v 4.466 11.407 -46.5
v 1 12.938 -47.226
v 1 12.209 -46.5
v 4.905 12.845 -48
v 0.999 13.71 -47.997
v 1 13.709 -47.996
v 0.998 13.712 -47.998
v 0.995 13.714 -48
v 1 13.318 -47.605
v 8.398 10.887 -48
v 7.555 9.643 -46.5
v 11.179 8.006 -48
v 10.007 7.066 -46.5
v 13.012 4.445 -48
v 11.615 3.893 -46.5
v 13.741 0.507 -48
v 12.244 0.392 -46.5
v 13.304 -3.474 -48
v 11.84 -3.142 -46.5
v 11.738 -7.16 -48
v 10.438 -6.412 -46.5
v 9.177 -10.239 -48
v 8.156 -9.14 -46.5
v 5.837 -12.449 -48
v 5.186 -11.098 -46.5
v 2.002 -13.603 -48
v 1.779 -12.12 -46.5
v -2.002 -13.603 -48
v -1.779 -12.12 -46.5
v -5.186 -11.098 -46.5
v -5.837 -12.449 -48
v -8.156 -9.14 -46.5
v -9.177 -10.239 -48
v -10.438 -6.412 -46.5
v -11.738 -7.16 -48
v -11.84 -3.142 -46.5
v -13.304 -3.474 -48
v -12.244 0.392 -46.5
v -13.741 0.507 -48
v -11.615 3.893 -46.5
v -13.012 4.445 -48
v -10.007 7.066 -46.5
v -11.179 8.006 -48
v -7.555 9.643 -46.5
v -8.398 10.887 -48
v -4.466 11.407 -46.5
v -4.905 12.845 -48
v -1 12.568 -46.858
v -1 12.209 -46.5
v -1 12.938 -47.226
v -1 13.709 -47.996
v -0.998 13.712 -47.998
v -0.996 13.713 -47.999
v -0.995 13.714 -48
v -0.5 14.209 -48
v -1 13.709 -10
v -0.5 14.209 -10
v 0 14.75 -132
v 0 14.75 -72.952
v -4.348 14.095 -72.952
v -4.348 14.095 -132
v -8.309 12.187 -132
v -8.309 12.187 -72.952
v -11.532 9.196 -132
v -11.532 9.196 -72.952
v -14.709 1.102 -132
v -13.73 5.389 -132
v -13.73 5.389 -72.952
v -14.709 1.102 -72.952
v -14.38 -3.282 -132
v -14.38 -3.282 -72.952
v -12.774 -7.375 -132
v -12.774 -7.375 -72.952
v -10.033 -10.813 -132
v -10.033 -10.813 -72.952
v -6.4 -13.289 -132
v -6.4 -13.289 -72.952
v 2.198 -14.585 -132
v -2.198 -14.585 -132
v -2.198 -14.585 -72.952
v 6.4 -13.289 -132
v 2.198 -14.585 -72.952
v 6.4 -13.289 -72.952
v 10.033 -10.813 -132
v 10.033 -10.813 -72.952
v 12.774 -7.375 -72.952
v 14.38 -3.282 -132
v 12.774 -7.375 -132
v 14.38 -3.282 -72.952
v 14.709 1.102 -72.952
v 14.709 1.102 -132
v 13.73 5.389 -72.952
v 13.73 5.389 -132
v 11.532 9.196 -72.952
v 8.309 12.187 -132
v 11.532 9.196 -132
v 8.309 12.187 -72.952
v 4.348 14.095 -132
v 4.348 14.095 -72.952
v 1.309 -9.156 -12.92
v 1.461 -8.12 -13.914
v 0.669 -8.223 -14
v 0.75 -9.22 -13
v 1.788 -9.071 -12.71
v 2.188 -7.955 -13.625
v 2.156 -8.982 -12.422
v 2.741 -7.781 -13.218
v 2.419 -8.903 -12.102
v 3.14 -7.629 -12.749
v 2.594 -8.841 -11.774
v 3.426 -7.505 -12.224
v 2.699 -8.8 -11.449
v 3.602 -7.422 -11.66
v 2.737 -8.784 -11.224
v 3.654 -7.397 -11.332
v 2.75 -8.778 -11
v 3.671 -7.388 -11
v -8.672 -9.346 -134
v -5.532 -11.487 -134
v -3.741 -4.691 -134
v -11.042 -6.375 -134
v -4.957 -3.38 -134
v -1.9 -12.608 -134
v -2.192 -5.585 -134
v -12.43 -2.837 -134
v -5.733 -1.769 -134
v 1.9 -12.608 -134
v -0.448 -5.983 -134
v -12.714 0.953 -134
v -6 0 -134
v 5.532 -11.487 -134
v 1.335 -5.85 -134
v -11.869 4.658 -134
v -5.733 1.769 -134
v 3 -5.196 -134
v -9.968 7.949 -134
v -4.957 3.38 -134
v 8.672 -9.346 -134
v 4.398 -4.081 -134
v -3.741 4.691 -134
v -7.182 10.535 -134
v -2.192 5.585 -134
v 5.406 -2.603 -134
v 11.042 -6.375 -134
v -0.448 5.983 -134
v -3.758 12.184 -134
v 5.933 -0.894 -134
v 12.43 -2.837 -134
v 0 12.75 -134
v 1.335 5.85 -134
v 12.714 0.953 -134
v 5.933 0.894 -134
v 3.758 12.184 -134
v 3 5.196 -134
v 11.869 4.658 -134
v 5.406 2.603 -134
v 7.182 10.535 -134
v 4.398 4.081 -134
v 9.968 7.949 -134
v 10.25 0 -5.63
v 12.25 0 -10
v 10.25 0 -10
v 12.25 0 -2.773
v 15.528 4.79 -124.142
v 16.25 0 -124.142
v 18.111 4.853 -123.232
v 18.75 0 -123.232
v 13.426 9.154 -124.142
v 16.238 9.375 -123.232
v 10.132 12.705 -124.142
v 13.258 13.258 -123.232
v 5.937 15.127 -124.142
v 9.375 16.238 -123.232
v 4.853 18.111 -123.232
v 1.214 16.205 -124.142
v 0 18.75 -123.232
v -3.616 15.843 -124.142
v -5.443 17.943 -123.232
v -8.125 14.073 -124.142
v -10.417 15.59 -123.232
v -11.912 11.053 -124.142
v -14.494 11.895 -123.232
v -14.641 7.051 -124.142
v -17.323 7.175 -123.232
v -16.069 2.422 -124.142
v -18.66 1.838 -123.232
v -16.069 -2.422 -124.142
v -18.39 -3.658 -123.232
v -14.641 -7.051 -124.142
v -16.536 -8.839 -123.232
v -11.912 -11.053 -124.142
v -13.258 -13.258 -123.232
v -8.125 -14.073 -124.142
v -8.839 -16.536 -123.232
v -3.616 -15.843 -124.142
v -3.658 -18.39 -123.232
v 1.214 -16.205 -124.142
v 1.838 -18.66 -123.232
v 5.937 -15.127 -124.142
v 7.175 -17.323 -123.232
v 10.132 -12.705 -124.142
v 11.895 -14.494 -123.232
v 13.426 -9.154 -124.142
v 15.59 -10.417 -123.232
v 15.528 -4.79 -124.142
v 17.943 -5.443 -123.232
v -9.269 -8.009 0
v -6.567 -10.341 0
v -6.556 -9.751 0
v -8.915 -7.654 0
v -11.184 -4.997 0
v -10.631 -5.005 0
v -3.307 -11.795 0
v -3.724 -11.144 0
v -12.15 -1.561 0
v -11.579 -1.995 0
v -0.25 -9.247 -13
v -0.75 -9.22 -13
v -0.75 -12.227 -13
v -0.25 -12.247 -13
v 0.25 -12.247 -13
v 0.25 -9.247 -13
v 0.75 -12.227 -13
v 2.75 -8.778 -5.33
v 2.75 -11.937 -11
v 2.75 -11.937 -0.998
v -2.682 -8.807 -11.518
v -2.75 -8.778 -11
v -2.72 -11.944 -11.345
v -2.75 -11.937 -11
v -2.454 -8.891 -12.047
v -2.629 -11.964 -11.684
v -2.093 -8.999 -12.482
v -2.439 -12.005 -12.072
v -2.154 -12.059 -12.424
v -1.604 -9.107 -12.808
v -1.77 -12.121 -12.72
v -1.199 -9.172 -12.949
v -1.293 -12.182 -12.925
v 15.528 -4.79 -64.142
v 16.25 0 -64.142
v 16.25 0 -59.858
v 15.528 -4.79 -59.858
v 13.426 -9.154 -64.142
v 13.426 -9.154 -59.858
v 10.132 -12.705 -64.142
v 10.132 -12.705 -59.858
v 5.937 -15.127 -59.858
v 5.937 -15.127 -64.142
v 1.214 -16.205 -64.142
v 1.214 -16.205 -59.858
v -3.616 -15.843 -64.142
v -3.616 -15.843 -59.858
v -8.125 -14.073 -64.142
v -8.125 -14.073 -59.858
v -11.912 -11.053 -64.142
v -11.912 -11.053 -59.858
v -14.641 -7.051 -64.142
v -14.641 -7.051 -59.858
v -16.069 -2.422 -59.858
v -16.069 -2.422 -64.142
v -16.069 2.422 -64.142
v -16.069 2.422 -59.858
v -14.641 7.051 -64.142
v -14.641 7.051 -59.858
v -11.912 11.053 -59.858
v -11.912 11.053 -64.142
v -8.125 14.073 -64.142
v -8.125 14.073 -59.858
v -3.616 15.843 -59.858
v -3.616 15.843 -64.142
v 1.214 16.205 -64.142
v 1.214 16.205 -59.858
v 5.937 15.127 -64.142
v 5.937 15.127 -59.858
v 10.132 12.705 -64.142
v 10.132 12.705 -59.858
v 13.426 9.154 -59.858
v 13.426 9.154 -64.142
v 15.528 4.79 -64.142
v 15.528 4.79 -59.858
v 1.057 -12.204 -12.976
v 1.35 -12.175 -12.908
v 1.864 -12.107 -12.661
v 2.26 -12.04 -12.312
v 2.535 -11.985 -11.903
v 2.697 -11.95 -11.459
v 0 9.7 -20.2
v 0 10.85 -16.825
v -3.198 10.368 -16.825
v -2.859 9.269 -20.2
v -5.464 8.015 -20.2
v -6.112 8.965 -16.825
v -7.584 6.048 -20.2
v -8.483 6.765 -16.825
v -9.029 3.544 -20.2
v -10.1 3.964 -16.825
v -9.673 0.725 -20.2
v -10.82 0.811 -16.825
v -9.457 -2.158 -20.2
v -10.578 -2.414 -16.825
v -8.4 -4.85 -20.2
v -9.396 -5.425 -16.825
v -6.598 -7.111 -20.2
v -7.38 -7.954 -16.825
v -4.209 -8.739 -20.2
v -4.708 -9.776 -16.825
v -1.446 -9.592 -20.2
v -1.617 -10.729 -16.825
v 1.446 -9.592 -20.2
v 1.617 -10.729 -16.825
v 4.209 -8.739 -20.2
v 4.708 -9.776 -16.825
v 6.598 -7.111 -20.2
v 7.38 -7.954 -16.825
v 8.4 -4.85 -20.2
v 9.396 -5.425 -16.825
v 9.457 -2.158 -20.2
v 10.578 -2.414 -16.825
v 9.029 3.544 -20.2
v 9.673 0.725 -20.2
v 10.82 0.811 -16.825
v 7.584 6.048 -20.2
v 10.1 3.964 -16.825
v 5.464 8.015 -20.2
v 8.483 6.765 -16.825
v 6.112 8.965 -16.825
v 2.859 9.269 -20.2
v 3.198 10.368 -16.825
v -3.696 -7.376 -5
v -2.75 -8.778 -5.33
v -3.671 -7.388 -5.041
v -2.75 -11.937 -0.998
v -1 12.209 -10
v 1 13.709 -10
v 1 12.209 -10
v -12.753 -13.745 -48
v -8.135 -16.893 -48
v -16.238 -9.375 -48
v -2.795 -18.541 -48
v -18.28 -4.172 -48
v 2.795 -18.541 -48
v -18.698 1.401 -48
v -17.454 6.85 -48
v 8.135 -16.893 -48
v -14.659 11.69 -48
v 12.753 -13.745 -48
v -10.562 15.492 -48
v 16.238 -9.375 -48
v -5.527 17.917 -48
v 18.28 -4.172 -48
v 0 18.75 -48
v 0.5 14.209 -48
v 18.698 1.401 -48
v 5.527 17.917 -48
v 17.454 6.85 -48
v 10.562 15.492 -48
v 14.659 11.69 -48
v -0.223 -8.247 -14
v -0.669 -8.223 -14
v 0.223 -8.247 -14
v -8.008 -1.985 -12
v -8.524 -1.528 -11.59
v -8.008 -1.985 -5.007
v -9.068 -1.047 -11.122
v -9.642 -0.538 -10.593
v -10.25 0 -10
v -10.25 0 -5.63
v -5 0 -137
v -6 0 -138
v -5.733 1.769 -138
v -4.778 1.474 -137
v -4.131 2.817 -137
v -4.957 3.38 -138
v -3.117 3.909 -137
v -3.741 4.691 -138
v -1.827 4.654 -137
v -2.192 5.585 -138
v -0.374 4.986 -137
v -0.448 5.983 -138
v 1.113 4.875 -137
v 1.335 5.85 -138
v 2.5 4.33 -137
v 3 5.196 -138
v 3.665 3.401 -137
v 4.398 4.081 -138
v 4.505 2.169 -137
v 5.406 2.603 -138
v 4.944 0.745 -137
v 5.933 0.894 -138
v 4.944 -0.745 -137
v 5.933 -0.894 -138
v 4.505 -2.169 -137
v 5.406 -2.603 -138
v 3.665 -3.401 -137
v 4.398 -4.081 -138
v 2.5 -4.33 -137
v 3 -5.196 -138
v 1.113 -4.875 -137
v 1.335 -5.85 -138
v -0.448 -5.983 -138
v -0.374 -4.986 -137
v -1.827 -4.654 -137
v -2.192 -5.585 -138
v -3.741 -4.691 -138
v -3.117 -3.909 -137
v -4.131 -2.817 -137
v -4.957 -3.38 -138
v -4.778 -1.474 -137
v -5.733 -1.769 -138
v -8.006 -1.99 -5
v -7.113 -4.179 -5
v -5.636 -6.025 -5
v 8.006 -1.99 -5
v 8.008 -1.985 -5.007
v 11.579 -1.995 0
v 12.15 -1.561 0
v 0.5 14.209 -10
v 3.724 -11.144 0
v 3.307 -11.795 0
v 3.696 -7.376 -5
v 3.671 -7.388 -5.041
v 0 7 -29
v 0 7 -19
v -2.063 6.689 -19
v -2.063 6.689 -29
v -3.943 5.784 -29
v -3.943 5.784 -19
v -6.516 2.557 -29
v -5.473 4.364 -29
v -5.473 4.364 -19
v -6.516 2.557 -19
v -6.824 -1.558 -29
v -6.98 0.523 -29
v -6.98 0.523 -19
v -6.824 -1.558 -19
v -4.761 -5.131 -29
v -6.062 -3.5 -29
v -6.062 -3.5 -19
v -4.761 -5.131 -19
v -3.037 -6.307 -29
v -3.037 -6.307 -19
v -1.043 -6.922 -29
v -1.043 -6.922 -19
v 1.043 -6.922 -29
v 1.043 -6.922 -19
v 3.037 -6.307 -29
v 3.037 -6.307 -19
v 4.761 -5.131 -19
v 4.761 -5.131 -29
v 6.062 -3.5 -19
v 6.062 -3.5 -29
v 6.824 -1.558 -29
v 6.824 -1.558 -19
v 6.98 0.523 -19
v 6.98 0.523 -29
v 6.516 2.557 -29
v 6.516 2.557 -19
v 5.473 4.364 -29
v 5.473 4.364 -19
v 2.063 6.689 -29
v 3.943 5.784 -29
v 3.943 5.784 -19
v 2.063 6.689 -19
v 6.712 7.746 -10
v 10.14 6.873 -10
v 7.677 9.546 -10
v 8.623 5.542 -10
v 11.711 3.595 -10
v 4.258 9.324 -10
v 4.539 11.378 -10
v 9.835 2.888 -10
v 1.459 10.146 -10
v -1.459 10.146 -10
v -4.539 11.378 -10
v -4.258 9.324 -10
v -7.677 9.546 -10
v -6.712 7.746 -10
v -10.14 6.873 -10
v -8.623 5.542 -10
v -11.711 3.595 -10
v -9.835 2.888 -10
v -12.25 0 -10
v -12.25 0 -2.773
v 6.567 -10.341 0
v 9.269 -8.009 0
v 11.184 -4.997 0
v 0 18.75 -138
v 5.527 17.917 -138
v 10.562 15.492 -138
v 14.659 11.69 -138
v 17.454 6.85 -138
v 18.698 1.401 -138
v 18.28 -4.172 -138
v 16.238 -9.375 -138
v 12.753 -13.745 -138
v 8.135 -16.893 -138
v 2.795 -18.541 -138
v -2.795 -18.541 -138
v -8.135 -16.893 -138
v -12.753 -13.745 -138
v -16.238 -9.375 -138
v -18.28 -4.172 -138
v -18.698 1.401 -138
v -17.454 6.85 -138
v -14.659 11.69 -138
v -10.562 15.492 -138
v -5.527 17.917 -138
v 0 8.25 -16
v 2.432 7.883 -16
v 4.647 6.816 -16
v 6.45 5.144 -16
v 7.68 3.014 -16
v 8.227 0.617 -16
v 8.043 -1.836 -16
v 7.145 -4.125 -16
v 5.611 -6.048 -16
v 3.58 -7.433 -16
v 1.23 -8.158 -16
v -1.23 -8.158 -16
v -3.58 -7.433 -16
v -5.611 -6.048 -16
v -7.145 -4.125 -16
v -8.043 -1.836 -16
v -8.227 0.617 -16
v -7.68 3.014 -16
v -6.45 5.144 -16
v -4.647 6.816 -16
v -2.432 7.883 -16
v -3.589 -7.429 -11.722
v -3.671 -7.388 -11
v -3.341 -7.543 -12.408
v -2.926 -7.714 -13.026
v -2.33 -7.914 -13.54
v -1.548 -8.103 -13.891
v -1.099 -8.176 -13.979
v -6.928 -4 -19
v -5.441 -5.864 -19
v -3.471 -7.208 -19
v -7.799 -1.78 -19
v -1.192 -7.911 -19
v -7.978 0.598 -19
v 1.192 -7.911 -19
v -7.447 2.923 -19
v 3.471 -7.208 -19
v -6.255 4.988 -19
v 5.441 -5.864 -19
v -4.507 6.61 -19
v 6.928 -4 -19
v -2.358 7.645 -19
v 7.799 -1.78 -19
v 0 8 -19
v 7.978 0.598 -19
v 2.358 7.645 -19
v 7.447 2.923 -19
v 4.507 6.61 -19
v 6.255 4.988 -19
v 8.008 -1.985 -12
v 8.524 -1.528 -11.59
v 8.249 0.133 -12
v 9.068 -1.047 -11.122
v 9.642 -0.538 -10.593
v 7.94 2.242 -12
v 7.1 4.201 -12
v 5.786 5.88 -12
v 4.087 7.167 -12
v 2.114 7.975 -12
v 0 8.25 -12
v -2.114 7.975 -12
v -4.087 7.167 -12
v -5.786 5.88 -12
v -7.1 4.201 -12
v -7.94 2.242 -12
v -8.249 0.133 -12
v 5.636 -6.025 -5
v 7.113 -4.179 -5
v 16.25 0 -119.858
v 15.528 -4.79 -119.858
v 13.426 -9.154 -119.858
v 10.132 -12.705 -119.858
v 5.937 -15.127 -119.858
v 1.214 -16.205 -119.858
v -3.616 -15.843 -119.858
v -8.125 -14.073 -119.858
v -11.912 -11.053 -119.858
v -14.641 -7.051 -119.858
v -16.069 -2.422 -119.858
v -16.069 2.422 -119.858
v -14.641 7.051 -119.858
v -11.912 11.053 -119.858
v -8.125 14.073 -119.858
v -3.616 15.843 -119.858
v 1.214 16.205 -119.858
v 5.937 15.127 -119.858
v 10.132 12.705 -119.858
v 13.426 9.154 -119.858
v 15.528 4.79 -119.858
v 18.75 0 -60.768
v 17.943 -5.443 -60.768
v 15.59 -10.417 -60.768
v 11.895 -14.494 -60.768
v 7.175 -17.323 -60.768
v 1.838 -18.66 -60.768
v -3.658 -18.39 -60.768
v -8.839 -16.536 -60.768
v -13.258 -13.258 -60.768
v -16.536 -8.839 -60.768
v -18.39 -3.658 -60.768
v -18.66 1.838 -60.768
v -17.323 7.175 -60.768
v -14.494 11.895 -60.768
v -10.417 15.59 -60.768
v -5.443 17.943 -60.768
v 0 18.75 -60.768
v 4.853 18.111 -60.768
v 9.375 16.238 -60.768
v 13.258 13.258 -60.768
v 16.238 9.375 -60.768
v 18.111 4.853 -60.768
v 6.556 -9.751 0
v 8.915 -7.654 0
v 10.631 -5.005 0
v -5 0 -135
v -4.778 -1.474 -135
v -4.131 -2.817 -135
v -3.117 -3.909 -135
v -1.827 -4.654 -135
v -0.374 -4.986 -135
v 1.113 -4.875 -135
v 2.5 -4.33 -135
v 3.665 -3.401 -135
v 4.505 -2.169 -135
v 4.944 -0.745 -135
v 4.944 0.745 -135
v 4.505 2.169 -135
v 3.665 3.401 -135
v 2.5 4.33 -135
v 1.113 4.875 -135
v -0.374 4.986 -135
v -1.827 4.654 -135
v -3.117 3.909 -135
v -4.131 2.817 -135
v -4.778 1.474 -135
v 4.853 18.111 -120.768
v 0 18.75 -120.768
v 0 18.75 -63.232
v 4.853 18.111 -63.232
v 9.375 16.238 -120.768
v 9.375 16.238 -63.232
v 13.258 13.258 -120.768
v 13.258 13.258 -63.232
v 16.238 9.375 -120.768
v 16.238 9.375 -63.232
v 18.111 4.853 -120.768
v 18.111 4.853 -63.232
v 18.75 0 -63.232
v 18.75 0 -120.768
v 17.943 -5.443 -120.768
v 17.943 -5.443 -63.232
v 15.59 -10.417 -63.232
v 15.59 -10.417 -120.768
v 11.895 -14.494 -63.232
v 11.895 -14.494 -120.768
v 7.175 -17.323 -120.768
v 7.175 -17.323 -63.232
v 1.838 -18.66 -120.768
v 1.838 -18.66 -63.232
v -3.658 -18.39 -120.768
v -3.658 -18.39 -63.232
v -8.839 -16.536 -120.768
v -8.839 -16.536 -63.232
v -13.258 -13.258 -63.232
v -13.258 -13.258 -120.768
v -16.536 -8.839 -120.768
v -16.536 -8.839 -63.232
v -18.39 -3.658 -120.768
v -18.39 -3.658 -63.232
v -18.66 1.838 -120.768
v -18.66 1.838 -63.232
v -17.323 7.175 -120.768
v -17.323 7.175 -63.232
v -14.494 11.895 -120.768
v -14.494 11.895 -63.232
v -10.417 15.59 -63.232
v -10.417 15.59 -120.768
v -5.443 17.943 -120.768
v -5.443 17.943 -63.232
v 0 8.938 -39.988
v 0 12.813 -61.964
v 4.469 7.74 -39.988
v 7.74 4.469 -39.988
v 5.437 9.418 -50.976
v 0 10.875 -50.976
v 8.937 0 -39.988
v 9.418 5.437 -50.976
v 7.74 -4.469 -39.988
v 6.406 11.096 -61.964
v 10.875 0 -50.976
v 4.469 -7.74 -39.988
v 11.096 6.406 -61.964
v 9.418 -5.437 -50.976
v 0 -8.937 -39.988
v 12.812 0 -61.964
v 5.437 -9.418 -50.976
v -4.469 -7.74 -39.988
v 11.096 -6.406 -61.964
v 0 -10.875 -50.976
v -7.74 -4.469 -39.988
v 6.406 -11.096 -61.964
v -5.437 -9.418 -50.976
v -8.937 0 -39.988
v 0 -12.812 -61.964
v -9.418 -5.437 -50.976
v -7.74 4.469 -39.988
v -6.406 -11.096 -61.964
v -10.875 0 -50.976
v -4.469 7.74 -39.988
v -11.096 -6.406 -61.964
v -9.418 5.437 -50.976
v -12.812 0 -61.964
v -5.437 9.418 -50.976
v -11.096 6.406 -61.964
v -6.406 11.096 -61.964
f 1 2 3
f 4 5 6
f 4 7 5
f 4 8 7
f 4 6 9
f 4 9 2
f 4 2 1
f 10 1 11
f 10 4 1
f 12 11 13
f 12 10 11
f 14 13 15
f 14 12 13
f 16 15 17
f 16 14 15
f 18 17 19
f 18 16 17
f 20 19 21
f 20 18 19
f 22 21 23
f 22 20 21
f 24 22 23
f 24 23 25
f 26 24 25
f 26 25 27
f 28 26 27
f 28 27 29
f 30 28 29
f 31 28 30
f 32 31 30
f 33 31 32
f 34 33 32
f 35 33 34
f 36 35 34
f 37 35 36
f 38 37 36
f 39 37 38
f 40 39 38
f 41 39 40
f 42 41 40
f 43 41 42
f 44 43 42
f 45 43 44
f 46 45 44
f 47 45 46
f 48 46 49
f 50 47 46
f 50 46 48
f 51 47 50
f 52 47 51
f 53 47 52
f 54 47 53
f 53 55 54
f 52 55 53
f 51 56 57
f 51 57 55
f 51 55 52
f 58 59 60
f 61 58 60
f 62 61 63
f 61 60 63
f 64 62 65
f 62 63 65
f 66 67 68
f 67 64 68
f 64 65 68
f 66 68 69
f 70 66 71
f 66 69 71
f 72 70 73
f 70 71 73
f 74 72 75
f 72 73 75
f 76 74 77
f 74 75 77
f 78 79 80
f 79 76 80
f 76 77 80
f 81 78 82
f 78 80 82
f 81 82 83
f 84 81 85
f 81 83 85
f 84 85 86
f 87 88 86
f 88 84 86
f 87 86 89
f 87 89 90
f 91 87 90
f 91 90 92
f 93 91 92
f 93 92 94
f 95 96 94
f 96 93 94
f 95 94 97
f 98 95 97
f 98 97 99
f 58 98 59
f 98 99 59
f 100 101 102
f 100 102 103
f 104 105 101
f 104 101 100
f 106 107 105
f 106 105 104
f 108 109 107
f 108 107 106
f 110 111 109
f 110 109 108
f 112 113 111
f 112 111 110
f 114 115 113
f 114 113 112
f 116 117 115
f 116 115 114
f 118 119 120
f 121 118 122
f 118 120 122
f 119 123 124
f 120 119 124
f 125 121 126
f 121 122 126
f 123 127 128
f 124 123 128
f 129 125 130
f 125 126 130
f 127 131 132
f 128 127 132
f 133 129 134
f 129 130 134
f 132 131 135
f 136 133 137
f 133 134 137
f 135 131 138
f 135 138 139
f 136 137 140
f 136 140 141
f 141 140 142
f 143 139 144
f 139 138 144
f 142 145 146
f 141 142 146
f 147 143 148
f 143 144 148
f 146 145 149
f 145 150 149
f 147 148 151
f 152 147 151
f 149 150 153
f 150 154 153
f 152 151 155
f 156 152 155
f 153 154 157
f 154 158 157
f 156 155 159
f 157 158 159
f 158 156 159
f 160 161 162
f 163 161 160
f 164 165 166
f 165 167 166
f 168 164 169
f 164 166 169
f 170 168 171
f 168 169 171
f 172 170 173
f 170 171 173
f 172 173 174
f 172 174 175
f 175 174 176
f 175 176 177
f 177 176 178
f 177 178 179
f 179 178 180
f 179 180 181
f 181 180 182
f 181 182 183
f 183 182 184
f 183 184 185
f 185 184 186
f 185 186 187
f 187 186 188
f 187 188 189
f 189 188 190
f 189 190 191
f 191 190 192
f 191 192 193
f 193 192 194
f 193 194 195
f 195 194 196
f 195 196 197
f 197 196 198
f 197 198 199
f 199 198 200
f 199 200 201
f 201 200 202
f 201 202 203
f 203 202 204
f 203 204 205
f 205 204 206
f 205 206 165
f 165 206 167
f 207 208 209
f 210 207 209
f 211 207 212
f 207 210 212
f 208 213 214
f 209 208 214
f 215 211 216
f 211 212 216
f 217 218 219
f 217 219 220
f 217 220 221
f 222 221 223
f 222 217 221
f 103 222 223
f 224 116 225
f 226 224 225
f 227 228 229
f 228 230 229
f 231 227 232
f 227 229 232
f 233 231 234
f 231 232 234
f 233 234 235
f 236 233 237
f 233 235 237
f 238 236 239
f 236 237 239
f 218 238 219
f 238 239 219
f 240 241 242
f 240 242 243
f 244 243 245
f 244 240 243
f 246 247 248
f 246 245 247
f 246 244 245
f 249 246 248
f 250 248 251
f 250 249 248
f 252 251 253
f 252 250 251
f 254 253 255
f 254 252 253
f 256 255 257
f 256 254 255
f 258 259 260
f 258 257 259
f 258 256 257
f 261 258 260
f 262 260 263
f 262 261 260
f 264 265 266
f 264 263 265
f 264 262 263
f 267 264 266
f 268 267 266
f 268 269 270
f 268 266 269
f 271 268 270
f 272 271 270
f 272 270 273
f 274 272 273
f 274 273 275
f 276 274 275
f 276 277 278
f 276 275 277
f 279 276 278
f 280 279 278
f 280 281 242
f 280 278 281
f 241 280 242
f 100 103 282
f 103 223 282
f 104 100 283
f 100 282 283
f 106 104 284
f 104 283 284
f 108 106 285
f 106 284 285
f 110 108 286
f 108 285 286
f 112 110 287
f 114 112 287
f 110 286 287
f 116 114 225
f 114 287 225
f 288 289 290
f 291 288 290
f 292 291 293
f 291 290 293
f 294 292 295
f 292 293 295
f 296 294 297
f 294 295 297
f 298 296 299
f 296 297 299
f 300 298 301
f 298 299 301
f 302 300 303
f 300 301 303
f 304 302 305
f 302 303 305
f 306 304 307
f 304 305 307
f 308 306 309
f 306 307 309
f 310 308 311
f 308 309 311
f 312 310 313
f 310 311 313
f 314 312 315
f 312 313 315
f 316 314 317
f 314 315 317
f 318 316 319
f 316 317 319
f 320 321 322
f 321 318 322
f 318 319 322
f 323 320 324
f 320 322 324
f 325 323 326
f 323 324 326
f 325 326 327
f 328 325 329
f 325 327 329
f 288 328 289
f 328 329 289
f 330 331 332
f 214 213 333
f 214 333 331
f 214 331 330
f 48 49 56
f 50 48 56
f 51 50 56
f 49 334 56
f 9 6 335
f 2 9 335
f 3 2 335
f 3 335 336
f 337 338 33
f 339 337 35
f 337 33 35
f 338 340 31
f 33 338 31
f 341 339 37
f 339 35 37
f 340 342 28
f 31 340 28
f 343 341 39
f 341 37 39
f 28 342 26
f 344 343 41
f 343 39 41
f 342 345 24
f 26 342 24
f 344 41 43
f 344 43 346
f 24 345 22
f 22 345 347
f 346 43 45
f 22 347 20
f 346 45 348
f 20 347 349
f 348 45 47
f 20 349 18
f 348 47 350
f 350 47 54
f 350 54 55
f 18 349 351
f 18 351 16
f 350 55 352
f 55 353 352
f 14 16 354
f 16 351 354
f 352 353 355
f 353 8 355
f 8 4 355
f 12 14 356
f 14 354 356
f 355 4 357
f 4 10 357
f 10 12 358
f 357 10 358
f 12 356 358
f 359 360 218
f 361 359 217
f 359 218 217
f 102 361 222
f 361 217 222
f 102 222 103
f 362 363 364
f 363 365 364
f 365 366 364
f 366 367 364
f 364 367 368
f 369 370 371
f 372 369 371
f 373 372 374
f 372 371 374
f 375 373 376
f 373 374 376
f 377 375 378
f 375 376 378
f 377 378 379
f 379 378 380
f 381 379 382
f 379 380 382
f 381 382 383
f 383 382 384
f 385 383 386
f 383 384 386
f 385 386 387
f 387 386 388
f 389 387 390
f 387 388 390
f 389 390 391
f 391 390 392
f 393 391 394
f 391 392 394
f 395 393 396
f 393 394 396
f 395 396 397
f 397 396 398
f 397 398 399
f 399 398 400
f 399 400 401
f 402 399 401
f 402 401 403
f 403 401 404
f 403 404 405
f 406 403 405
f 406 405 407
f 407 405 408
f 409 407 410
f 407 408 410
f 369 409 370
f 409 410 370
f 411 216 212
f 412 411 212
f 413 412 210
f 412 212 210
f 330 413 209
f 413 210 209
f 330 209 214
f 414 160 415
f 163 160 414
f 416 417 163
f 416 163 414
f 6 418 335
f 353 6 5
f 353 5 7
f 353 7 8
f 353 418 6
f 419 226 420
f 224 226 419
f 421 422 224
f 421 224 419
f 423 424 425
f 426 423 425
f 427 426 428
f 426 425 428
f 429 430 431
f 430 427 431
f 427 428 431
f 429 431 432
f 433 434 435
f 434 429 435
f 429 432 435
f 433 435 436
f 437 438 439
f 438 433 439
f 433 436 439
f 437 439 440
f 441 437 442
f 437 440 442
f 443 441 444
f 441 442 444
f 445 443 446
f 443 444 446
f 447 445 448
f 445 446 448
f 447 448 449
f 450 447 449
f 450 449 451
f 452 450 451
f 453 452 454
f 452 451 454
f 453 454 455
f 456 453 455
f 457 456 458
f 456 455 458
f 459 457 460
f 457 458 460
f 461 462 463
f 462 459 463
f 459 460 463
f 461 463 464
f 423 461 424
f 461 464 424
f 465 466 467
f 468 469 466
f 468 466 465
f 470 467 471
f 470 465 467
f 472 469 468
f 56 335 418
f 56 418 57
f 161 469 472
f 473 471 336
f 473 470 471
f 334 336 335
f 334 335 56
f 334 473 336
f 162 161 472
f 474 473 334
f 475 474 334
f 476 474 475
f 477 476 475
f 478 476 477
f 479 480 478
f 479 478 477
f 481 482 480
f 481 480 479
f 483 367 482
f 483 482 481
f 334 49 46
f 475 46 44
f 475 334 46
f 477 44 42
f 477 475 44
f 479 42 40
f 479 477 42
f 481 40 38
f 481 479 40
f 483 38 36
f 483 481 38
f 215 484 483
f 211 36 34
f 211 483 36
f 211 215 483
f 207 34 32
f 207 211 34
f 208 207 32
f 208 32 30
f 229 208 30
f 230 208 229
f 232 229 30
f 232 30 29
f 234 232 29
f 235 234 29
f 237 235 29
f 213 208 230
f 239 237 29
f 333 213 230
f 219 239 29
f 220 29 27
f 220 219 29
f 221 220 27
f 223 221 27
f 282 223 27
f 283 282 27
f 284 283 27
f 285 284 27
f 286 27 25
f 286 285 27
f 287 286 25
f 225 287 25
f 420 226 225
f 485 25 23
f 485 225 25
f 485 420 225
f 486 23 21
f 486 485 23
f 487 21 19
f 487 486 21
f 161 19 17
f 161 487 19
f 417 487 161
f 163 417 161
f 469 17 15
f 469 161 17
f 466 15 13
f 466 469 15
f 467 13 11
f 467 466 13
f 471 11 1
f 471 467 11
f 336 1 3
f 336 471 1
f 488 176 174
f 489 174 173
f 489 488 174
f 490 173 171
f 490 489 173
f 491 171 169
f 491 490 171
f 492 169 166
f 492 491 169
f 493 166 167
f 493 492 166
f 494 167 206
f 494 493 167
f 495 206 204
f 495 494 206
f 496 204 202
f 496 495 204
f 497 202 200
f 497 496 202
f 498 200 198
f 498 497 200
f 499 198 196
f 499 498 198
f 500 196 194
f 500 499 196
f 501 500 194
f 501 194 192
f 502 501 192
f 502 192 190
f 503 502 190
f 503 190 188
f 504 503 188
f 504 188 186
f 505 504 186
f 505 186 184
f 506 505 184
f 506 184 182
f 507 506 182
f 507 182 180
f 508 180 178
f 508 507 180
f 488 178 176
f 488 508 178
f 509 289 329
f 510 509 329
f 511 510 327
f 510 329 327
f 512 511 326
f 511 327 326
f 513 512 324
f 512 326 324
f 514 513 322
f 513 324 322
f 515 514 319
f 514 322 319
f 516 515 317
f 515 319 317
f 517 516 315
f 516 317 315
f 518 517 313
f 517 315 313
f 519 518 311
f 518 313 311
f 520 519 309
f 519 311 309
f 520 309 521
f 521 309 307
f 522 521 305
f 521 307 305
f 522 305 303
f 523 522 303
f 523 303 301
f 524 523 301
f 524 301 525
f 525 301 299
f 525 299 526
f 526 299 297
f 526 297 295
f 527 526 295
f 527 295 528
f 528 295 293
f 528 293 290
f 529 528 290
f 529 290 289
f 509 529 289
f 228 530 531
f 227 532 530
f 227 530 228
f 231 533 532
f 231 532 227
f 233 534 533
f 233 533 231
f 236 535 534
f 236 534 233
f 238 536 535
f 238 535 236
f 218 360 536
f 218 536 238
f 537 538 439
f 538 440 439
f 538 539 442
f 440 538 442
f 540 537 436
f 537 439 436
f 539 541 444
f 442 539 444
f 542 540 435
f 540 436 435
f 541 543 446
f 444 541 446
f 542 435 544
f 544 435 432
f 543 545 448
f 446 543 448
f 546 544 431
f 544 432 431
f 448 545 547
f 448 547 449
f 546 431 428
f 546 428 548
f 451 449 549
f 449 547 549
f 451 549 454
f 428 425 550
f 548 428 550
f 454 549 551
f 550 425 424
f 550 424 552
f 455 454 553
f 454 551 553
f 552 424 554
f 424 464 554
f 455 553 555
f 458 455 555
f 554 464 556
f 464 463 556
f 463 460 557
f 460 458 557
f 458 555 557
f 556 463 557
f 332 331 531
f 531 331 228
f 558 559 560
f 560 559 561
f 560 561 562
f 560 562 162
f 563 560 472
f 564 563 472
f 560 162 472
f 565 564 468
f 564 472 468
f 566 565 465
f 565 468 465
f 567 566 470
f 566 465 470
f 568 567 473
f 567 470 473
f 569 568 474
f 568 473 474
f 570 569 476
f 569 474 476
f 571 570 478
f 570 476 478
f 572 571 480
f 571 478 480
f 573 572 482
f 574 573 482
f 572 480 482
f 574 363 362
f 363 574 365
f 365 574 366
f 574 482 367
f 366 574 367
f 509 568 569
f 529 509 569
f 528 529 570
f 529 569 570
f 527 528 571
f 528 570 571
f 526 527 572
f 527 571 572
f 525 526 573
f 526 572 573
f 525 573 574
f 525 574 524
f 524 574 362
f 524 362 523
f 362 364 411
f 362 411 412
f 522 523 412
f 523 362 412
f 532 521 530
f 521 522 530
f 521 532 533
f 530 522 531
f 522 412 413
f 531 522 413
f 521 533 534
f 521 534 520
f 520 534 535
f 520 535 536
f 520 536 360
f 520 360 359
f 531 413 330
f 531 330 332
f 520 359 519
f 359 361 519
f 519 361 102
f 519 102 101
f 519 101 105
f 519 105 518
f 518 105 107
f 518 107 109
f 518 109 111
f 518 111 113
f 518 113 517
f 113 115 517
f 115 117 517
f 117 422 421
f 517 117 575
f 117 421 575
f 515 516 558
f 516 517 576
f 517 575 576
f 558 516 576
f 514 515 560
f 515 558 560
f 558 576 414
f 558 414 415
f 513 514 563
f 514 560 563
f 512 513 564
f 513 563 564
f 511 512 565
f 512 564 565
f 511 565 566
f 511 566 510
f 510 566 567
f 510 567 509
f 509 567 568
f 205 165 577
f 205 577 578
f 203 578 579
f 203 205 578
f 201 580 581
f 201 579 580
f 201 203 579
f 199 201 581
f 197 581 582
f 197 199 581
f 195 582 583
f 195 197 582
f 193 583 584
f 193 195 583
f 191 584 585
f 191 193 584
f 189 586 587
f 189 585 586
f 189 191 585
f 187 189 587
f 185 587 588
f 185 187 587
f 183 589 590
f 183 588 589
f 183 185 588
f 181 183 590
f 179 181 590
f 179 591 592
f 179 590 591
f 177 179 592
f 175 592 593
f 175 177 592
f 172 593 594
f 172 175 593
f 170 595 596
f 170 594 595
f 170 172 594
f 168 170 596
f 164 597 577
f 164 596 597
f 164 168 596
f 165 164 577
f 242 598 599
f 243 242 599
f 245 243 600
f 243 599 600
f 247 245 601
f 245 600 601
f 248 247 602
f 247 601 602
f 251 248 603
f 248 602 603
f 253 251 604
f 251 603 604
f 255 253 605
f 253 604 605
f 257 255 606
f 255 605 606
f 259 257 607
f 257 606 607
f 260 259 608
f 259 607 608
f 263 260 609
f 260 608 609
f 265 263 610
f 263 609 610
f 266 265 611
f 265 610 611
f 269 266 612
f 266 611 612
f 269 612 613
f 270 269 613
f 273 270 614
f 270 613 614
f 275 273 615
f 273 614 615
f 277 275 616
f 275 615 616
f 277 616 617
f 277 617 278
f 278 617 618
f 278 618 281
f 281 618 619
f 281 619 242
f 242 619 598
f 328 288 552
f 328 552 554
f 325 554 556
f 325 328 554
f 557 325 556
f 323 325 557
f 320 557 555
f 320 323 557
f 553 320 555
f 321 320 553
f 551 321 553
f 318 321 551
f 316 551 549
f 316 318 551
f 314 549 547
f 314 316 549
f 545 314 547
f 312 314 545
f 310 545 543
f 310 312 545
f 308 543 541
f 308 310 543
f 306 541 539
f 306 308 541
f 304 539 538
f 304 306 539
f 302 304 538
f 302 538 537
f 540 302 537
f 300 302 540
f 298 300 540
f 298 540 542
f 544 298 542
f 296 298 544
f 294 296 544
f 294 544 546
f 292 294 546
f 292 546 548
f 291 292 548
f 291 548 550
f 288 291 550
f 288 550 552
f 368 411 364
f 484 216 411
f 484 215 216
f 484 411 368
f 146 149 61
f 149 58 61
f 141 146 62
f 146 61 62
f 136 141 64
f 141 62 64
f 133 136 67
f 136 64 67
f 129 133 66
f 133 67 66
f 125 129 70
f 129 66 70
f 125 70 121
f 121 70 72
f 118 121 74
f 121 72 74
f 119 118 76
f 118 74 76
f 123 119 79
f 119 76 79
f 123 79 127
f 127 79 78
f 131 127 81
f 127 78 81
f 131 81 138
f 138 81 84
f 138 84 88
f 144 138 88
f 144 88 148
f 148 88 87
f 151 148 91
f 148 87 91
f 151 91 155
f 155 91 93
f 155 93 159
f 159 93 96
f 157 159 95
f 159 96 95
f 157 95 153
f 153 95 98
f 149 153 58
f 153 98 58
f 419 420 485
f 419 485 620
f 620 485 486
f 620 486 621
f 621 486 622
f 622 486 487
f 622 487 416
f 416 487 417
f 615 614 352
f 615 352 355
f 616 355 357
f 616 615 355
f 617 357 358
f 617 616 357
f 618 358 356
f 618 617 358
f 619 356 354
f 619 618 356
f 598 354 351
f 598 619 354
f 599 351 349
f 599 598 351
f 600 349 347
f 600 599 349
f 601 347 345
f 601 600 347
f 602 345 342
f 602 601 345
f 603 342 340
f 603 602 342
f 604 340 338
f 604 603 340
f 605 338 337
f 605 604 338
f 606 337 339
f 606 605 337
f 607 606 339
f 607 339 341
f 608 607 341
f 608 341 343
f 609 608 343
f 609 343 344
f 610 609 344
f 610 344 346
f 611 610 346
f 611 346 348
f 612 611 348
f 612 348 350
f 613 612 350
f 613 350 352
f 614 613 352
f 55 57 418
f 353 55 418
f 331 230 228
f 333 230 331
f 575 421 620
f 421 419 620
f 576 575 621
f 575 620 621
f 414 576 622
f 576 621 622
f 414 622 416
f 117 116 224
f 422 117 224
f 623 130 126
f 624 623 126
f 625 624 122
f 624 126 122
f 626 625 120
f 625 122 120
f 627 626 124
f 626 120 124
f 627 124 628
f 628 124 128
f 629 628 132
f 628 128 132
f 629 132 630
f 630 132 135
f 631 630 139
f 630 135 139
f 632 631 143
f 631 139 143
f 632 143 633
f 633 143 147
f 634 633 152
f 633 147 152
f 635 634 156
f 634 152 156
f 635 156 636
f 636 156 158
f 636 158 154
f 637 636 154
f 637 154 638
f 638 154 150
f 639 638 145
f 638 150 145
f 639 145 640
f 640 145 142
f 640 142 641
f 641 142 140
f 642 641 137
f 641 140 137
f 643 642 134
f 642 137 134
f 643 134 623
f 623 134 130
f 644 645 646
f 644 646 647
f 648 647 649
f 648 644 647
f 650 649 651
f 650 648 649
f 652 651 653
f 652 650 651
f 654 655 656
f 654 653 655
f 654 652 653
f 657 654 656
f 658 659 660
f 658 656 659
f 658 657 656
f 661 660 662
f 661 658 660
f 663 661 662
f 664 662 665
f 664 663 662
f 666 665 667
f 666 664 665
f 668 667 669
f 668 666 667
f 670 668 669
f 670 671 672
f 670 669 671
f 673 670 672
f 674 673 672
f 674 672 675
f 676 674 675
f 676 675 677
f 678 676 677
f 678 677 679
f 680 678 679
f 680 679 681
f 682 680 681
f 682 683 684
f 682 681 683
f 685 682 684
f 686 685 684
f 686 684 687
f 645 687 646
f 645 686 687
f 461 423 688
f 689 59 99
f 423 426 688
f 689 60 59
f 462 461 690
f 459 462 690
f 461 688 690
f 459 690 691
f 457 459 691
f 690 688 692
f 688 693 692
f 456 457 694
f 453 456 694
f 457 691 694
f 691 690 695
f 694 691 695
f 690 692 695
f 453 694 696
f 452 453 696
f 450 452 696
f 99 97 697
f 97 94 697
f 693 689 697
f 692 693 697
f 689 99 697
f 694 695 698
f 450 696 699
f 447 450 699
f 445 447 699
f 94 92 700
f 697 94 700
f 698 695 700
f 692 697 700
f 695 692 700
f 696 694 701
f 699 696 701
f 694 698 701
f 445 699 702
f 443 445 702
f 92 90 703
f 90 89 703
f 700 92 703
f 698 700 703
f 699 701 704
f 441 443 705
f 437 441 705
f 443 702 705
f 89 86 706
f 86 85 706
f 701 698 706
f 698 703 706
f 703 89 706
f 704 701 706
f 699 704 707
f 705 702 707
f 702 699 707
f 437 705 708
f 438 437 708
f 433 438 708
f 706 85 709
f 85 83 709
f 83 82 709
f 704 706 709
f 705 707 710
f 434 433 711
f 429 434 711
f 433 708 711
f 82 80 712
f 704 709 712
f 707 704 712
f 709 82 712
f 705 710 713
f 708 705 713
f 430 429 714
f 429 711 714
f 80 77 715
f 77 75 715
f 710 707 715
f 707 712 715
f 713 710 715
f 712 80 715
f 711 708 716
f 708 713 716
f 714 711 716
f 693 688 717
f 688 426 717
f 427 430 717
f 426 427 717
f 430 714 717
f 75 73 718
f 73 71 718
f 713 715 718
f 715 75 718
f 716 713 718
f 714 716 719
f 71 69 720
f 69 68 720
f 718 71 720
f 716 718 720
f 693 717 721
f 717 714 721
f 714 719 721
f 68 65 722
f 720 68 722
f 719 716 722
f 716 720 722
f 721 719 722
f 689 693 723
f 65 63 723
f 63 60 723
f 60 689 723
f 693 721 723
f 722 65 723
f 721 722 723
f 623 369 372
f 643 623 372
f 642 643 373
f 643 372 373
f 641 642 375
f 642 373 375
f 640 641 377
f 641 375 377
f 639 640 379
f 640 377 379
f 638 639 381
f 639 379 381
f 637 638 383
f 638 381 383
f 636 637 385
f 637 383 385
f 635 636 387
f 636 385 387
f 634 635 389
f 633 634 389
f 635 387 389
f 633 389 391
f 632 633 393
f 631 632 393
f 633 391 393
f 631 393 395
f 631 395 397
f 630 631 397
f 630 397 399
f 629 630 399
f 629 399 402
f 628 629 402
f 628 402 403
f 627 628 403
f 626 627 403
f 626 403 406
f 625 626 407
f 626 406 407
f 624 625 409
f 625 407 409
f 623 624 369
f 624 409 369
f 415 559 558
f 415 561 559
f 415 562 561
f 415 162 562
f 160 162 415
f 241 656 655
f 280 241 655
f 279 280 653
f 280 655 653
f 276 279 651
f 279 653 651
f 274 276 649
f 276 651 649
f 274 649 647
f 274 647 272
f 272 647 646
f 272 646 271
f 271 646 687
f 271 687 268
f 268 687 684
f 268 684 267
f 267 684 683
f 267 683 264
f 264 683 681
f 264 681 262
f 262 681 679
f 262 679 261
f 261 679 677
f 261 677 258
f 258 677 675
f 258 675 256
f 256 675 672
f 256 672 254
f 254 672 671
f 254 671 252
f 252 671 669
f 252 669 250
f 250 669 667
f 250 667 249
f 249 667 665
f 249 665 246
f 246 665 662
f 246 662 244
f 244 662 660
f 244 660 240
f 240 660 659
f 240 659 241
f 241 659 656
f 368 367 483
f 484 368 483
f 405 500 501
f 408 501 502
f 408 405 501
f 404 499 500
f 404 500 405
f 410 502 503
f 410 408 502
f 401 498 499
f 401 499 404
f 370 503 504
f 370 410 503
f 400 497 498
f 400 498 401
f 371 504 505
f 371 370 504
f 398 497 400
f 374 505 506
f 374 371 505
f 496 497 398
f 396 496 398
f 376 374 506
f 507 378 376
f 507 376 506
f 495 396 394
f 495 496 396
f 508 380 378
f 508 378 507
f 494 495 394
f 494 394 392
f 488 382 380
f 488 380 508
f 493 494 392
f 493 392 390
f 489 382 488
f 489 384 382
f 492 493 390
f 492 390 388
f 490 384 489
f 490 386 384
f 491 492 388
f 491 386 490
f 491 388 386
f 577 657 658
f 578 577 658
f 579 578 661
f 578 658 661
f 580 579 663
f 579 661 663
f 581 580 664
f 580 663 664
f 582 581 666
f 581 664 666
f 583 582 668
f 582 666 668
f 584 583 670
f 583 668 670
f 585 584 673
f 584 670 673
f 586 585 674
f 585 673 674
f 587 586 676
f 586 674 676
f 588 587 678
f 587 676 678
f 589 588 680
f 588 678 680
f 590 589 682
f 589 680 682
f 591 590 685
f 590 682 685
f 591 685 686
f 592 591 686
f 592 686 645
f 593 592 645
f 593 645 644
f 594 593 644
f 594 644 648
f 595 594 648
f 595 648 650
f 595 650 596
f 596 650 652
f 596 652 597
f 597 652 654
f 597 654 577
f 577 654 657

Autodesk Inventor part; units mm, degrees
ref_plane "YZ Plane" through (0, 0, 0) normal (1, 0, 0) x (0, 1, 0)
ref_plane "XZ Plane" through (0, 0, 0) normal (0, 1, 0) x (-1, 0, 0)
ref_plane "XY Plane" through (0, 0, 0) normal (0, 0, 1) x (1, 0, 0)
sketch "Esquisse1" plane through (0, 0, 0) normal (1, 0, 0) x (0, 1, 0)
  line L0 (0, 0) -> (0, -31.2712)
  line L1 (18.75, -48) -> (18.75, -138)
  line L2 (18.75, -138) -> (0, -138)
  line L3 (14.75, -134) -> (14.75, -72.9524)
  line L4 (14.75, -72.9524) -> (7, -29)
  line L5 (7, -29) -> (7, -19)
  line L6 (7, -19) -> (8, -19)
  line L7 (8, -19) -> (9.7, -20.2)
  line L8 (9.7, -20.2) -> (10.85, -16.8246)
  line L9 (10.85, -16.8246) -> (8.25, -16)
  circle A0 centre (8.85, -17.7639) radius 1.5 construction
  line L10 (8.25, -16) -> (8.25, -5)
  line L11 (8.25, -5) -> (11.75, 0)
  line L12 (18.75, -48) -> (12.25, -48)
  line L13 (12.25, -48) -> (12.25, 0)
  line L14 (12.25, 0) -> (11.75, 0)
  line L15 (0, -138) -> (0, -134)
  line L16 (14.75, -134) -> (0, -134)
  point P0 (9.7477, -44.583)
  dimension "d1" = 37.5
  dimension "d3" = 14
  dimension "d6" = 3
  dimension "d7" = 10
  dimension "d8" = 1
  dimension "d11" = 3
  dimension "d12" = 0.6
  dimension "d13" = 1.2
  dimension "d14" = 1.7
  dimension "d15" = 2.6
  dimension "d29" = 24.5
  dimension "d30" = 0.5
  dimension "d31" = 48
  dimension "d34" = 11
  dimension "d36" = 16.5
  dimension "d37" = 19
  dimension "d38" = 90
  dimension "d58" = 7.75
  dimension "d59" = 170
  dimension "d60" = 19.4954
  dimension "d61" = 4
  dimension "d62" = 4
revolve "Révolution2" add sketch "Esquisse1" angle 360 about axis through (0, 0, 0) along (0, 0, -1)
sketch "Esquisse2" plane through (0, 0, 0) normal (0, 1, 0) x (-1, 0, 0)
  line L0 (-18.75, -48) -> (18.75, -48) projected
  line L1 (-18.75, -138) -> (18.75, -138) projected
  line L2 (-14.75, -72.9524) -> (14.75, -72.9524) projected
  line L3 (-7, -29) -> (7, -29) projected
  line L4 (-18.75, -48) -> (-18.75, -138) projected
  line L5 (-18.75, -60.7677) -> (-16.25, -59.8578)
  line L6 (-16.25, -59.8578) -> (-16.25, -64.1422)
  line L7 (-16.25, -64.1422) -> (-18.75, -63.2323)
  circle A0 centre (-17.75, -62) radius 1.5 construction
  line L8 (0, -168) -> (0, 28) projected
  point P0 (0, 0)
  dimension "d42" = 3
  dimension "d45" = 1
  dimension "d46" = 70
  dimension "d47" = 70
  dimension "d48" = 14
revolve "Révolution3" cut sketch "Esquisse2" angle 360 about axis through (0, 0, -10) along (0, 0, 1) contours L5 L6 L7 L4
chamfer "Chanfrein4" distance 1.5 angle 45 1 edges at (0, -12.25, -48)
pattern_linear "Réseau rectangulaire1" count 2 spacing 60 along (0, 0, -1) of "Révolution3"
chamfer "Chanfrein5" distance 2 angle 45 1 edges at (0, -14.75, -134)
sketch "Esquisse3" plane through (0, 0, 0) normal (0, 0, 1) x (1, 0, 0)
  circle A0 centre (0, 0) radius 11.75 projected
  circle A1 centre (0, 0) radius 12.25 projected
  line L0 (-1, 14.2091) -> (1, 14.2091)
  line L1 (1, 14.2091) -> (1, 12.2091)
  line L2 (1, 12.2091) -> (-1, 12.2091)
  line L3 (-1, 12.2091) -> (-1, 14.2091)
  circle A2 centre (0, 0) radius 12.25 projected
  point P0 (0, 12.2091)
  dimension "d66" = 2
  dimension "d67" = 2
extrude "Extrusion1" add sketch "Esquisse3" against normal up to surface (48 mm away) contours L2 A1 | A1 L3 L0 L1 picked at (-0.1112, 12.2212)
chamfer "Chanfrein6" distance 0.5 angle 45 2 edges at (1, 14.2091, -24) (-1, 14.2091, -24)
sketch "Esquisse8" plane through (0, 0, -138) normal (0, 0, -1) x (-1, 0, 0)
  circle A0 centre (0, 0) radius 5
  dimension "d100" = 10
extrude "Extrusion5" cut sketch "Esquisse8" against normal up to surface (4 mm away)
chamfer "Chanfrein8" distance 1 angle 45 2 edges at (5, 0, -138) (5, 0, -134)
sketch "Esquisse9" plane through (0, 0, 0) normal (0, 1, 0) x (-1, 0, 0)
  line L0 (1, 0) -> (1, -46.5) projected
  line L1 (-1, -46.5) -> (1, -46.5) projected
  line L2 (-1, -46.5) -> (-1, 0) projected
  line L3 (-1, 0) -> (1, 0) projected
  line L4 (8.25, -5) -> (11.75, 0) projected
  line L5 (-8.25, -5) -> (-11.75, 0) projected
  line L6 (12.25, 0) -> (-12.25, 0)
  line L7 (-12.25, 0) -> (-12.25, -10)
  line L8 (-12.25, -10) -> (12.25, -10)
  line L9 (12.25, -10) -> (12.25, 0)
  line L10 (-12.25, 0) -> (12.25, 0) projected
  line L11 (-8.25, -5) -> (8.25, -5) projected
  line L12 (-12.25, 0) -> (-12.25, -46.5) projected
  point P0 (0, 0)
  dimension "d112" = 10
  dimension "d113" = 5
extrude "Extrusion6" cut sketch "Esquisse9" along normal blind 15 contours L6 L4 L11 L0 | L0 L11 L2 L3 | L11 L4 L6 L9 L8 L0 | L0 L8 L2 L11 | L2 L11 L5 L6 | L2 L8 L7 L6 L5 L11
chamfer "Chanfrein9" distance 2 angle 45 6 edges at (10, 0, -2.5) (-10, 0, -2.5) (8.25, 0, -7.5) (-8.25, 0, -7.5) (5.8336, 5.8336, -10) (-5.8336, 5.8336, -10)
sketch "Esquisse10" plane through (0, 0, 0) normal (0, 0, 1) x (1, 0, 0)
  arc A0 (-8.0064, -1.99) -> (8.0064, -1.99) centre (0, 0) ccw projected
  arc A1 (-11.5794, -1.9951) -> (11.5794, -1.9951) centre (0, 0) ccw projected
  arc A2 (-11.5794, -1.9951) -> (11.5794, -1.9951) centre (0, 0) ccw projected
  arc A3 (-12.1502, -1.5608) -> (12.1502, -1.5608) centre (0, 0) ccw projected
  line L0 (-2.75, -7.7782) -> (2.75, -7.7782)
  line L1 (2.75, -7.7782) -> (2.75, -12.25)
  line L2 (2.75, -12.25) -> (-2.75, -12.25)
  line L3 (-2.75, -12.25) -> (-2.75, -7.7782)
  arc A4 (-12.1502, -1.5608) -> (12.1502, -1.5608) centre (0, 0) ccw projected
  dimension "d114" = 5.5
extrude "Extrusion7" cut sketch "Esquisse10" against normal blind 13 contours A0 L1 A1 L3 | A1 L1 A3 L3 | A3 L2 L3 | L1 L2 A3
fillet "Congé1" radius 2 2 edges at (-2.75, -9.8578, -13) (2.75, -9.8578, -13)
chamfer "Chanfrein10" distance 1 angle 45 7 edges at (-2.75, -7.7782, -8) (-2.2552, -7.9358, -12.3169) (0, -8.25, -13) (2.2552, -7.9358, -12.3169) (2.75, -7.7782, -8) (-2.75, -9.4401, -2.7393) (2.75, -9.4401, -2.7393)
equation "\"d47\" = d46"
properties part number "douille_bloqueur"
